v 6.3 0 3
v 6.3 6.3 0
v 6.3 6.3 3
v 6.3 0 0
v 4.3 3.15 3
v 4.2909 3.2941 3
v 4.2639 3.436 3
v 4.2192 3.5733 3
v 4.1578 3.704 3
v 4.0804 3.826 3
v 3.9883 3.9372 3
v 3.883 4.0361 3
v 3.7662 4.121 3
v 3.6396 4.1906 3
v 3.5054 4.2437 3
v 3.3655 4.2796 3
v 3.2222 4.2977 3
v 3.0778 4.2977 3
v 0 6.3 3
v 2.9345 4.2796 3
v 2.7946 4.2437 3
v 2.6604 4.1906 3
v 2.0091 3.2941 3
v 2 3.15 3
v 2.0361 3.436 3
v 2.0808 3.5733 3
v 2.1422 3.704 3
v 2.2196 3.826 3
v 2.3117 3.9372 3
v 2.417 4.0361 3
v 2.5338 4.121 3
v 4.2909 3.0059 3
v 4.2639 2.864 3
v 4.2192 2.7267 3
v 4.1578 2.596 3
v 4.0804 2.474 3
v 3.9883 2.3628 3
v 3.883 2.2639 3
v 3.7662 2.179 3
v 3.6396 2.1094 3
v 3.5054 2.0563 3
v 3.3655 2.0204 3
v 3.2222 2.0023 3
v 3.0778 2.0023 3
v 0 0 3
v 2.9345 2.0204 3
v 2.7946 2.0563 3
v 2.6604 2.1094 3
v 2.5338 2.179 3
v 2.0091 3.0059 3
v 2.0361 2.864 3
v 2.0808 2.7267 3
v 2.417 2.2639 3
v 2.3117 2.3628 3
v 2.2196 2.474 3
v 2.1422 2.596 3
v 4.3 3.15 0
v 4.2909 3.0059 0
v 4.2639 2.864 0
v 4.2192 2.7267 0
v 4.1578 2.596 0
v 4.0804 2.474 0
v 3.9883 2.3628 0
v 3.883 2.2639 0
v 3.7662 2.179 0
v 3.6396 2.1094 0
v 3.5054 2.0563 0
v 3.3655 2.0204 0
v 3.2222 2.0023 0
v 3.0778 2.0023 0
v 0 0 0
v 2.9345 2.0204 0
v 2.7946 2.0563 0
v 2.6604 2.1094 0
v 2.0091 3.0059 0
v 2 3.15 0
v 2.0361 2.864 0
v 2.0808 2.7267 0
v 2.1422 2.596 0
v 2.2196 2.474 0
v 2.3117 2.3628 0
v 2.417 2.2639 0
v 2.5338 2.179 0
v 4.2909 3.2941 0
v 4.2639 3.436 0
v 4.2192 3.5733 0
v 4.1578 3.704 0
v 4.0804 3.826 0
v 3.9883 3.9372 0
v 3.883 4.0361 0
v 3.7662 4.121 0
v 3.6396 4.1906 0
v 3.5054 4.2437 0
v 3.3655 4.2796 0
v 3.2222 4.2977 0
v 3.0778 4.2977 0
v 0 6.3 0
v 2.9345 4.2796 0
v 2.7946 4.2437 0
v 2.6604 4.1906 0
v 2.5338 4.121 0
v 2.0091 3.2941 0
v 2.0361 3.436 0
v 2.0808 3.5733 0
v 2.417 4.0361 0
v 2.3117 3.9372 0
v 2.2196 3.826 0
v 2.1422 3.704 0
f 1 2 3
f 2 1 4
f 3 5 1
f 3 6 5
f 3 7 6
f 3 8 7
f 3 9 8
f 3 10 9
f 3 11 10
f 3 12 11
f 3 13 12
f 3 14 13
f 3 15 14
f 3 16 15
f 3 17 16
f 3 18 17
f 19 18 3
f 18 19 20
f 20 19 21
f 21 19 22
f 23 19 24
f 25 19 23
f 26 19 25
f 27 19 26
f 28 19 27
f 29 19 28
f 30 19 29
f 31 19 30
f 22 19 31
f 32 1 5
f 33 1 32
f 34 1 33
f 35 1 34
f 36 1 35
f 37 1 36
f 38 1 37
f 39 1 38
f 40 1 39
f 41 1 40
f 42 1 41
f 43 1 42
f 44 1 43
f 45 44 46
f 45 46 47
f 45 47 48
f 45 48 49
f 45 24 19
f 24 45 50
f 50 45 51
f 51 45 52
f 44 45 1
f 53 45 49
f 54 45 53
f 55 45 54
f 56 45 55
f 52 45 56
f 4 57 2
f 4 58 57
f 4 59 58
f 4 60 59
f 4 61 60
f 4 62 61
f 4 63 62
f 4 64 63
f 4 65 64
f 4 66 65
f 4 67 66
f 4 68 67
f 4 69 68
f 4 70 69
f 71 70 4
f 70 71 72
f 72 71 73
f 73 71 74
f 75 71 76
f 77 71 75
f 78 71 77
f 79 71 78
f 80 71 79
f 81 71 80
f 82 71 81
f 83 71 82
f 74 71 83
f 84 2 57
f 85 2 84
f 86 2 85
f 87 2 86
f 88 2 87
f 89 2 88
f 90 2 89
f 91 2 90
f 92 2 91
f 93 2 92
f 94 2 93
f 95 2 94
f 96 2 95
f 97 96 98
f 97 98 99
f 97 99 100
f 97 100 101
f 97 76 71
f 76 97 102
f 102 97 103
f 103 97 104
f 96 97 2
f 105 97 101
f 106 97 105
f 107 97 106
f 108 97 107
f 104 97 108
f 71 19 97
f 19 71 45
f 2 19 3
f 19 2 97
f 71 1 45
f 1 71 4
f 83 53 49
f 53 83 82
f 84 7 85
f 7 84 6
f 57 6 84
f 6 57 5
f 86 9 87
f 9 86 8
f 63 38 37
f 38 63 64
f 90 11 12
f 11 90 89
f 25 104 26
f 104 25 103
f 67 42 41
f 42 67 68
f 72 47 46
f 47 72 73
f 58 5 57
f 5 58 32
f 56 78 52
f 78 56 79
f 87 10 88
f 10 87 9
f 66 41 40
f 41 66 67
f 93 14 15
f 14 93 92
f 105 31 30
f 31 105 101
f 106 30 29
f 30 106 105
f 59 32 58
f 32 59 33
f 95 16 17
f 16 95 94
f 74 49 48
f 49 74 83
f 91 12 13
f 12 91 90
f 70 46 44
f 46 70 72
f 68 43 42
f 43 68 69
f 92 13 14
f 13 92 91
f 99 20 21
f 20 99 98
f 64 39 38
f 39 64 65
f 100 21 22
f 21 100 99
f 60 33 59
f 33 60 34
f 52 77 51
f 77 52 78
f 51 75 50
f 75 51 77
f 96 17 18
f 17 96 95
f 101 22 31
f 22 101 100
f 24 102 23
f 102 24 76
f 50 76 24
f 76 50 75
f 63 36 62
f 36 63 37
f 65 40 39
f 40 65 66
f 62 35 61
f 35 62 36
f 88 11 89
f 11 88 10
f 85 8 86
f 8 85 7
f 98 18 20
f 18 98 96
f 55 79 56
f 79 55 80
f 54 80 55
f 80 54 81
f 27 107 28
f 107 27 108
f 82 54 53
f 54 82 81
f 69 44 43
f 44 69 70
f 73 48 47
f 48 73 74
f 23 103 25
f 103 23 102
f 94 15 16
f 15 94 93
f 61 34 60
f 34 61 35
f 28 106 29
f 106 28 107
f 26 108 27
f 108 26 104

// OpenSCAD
$fn=50;
e=0.1;

wire_d=1.5;

wire_r=wire_d/2+0.4;
height=3;
thickness=2;


difference(){
    cube([2*wire_r+2*thickness, 2*wire_r+2*thickness, height]);

    translate([wire_r+thickness, wire_r+thickness,0])
        cylinder(height, r=wire_r);

}
